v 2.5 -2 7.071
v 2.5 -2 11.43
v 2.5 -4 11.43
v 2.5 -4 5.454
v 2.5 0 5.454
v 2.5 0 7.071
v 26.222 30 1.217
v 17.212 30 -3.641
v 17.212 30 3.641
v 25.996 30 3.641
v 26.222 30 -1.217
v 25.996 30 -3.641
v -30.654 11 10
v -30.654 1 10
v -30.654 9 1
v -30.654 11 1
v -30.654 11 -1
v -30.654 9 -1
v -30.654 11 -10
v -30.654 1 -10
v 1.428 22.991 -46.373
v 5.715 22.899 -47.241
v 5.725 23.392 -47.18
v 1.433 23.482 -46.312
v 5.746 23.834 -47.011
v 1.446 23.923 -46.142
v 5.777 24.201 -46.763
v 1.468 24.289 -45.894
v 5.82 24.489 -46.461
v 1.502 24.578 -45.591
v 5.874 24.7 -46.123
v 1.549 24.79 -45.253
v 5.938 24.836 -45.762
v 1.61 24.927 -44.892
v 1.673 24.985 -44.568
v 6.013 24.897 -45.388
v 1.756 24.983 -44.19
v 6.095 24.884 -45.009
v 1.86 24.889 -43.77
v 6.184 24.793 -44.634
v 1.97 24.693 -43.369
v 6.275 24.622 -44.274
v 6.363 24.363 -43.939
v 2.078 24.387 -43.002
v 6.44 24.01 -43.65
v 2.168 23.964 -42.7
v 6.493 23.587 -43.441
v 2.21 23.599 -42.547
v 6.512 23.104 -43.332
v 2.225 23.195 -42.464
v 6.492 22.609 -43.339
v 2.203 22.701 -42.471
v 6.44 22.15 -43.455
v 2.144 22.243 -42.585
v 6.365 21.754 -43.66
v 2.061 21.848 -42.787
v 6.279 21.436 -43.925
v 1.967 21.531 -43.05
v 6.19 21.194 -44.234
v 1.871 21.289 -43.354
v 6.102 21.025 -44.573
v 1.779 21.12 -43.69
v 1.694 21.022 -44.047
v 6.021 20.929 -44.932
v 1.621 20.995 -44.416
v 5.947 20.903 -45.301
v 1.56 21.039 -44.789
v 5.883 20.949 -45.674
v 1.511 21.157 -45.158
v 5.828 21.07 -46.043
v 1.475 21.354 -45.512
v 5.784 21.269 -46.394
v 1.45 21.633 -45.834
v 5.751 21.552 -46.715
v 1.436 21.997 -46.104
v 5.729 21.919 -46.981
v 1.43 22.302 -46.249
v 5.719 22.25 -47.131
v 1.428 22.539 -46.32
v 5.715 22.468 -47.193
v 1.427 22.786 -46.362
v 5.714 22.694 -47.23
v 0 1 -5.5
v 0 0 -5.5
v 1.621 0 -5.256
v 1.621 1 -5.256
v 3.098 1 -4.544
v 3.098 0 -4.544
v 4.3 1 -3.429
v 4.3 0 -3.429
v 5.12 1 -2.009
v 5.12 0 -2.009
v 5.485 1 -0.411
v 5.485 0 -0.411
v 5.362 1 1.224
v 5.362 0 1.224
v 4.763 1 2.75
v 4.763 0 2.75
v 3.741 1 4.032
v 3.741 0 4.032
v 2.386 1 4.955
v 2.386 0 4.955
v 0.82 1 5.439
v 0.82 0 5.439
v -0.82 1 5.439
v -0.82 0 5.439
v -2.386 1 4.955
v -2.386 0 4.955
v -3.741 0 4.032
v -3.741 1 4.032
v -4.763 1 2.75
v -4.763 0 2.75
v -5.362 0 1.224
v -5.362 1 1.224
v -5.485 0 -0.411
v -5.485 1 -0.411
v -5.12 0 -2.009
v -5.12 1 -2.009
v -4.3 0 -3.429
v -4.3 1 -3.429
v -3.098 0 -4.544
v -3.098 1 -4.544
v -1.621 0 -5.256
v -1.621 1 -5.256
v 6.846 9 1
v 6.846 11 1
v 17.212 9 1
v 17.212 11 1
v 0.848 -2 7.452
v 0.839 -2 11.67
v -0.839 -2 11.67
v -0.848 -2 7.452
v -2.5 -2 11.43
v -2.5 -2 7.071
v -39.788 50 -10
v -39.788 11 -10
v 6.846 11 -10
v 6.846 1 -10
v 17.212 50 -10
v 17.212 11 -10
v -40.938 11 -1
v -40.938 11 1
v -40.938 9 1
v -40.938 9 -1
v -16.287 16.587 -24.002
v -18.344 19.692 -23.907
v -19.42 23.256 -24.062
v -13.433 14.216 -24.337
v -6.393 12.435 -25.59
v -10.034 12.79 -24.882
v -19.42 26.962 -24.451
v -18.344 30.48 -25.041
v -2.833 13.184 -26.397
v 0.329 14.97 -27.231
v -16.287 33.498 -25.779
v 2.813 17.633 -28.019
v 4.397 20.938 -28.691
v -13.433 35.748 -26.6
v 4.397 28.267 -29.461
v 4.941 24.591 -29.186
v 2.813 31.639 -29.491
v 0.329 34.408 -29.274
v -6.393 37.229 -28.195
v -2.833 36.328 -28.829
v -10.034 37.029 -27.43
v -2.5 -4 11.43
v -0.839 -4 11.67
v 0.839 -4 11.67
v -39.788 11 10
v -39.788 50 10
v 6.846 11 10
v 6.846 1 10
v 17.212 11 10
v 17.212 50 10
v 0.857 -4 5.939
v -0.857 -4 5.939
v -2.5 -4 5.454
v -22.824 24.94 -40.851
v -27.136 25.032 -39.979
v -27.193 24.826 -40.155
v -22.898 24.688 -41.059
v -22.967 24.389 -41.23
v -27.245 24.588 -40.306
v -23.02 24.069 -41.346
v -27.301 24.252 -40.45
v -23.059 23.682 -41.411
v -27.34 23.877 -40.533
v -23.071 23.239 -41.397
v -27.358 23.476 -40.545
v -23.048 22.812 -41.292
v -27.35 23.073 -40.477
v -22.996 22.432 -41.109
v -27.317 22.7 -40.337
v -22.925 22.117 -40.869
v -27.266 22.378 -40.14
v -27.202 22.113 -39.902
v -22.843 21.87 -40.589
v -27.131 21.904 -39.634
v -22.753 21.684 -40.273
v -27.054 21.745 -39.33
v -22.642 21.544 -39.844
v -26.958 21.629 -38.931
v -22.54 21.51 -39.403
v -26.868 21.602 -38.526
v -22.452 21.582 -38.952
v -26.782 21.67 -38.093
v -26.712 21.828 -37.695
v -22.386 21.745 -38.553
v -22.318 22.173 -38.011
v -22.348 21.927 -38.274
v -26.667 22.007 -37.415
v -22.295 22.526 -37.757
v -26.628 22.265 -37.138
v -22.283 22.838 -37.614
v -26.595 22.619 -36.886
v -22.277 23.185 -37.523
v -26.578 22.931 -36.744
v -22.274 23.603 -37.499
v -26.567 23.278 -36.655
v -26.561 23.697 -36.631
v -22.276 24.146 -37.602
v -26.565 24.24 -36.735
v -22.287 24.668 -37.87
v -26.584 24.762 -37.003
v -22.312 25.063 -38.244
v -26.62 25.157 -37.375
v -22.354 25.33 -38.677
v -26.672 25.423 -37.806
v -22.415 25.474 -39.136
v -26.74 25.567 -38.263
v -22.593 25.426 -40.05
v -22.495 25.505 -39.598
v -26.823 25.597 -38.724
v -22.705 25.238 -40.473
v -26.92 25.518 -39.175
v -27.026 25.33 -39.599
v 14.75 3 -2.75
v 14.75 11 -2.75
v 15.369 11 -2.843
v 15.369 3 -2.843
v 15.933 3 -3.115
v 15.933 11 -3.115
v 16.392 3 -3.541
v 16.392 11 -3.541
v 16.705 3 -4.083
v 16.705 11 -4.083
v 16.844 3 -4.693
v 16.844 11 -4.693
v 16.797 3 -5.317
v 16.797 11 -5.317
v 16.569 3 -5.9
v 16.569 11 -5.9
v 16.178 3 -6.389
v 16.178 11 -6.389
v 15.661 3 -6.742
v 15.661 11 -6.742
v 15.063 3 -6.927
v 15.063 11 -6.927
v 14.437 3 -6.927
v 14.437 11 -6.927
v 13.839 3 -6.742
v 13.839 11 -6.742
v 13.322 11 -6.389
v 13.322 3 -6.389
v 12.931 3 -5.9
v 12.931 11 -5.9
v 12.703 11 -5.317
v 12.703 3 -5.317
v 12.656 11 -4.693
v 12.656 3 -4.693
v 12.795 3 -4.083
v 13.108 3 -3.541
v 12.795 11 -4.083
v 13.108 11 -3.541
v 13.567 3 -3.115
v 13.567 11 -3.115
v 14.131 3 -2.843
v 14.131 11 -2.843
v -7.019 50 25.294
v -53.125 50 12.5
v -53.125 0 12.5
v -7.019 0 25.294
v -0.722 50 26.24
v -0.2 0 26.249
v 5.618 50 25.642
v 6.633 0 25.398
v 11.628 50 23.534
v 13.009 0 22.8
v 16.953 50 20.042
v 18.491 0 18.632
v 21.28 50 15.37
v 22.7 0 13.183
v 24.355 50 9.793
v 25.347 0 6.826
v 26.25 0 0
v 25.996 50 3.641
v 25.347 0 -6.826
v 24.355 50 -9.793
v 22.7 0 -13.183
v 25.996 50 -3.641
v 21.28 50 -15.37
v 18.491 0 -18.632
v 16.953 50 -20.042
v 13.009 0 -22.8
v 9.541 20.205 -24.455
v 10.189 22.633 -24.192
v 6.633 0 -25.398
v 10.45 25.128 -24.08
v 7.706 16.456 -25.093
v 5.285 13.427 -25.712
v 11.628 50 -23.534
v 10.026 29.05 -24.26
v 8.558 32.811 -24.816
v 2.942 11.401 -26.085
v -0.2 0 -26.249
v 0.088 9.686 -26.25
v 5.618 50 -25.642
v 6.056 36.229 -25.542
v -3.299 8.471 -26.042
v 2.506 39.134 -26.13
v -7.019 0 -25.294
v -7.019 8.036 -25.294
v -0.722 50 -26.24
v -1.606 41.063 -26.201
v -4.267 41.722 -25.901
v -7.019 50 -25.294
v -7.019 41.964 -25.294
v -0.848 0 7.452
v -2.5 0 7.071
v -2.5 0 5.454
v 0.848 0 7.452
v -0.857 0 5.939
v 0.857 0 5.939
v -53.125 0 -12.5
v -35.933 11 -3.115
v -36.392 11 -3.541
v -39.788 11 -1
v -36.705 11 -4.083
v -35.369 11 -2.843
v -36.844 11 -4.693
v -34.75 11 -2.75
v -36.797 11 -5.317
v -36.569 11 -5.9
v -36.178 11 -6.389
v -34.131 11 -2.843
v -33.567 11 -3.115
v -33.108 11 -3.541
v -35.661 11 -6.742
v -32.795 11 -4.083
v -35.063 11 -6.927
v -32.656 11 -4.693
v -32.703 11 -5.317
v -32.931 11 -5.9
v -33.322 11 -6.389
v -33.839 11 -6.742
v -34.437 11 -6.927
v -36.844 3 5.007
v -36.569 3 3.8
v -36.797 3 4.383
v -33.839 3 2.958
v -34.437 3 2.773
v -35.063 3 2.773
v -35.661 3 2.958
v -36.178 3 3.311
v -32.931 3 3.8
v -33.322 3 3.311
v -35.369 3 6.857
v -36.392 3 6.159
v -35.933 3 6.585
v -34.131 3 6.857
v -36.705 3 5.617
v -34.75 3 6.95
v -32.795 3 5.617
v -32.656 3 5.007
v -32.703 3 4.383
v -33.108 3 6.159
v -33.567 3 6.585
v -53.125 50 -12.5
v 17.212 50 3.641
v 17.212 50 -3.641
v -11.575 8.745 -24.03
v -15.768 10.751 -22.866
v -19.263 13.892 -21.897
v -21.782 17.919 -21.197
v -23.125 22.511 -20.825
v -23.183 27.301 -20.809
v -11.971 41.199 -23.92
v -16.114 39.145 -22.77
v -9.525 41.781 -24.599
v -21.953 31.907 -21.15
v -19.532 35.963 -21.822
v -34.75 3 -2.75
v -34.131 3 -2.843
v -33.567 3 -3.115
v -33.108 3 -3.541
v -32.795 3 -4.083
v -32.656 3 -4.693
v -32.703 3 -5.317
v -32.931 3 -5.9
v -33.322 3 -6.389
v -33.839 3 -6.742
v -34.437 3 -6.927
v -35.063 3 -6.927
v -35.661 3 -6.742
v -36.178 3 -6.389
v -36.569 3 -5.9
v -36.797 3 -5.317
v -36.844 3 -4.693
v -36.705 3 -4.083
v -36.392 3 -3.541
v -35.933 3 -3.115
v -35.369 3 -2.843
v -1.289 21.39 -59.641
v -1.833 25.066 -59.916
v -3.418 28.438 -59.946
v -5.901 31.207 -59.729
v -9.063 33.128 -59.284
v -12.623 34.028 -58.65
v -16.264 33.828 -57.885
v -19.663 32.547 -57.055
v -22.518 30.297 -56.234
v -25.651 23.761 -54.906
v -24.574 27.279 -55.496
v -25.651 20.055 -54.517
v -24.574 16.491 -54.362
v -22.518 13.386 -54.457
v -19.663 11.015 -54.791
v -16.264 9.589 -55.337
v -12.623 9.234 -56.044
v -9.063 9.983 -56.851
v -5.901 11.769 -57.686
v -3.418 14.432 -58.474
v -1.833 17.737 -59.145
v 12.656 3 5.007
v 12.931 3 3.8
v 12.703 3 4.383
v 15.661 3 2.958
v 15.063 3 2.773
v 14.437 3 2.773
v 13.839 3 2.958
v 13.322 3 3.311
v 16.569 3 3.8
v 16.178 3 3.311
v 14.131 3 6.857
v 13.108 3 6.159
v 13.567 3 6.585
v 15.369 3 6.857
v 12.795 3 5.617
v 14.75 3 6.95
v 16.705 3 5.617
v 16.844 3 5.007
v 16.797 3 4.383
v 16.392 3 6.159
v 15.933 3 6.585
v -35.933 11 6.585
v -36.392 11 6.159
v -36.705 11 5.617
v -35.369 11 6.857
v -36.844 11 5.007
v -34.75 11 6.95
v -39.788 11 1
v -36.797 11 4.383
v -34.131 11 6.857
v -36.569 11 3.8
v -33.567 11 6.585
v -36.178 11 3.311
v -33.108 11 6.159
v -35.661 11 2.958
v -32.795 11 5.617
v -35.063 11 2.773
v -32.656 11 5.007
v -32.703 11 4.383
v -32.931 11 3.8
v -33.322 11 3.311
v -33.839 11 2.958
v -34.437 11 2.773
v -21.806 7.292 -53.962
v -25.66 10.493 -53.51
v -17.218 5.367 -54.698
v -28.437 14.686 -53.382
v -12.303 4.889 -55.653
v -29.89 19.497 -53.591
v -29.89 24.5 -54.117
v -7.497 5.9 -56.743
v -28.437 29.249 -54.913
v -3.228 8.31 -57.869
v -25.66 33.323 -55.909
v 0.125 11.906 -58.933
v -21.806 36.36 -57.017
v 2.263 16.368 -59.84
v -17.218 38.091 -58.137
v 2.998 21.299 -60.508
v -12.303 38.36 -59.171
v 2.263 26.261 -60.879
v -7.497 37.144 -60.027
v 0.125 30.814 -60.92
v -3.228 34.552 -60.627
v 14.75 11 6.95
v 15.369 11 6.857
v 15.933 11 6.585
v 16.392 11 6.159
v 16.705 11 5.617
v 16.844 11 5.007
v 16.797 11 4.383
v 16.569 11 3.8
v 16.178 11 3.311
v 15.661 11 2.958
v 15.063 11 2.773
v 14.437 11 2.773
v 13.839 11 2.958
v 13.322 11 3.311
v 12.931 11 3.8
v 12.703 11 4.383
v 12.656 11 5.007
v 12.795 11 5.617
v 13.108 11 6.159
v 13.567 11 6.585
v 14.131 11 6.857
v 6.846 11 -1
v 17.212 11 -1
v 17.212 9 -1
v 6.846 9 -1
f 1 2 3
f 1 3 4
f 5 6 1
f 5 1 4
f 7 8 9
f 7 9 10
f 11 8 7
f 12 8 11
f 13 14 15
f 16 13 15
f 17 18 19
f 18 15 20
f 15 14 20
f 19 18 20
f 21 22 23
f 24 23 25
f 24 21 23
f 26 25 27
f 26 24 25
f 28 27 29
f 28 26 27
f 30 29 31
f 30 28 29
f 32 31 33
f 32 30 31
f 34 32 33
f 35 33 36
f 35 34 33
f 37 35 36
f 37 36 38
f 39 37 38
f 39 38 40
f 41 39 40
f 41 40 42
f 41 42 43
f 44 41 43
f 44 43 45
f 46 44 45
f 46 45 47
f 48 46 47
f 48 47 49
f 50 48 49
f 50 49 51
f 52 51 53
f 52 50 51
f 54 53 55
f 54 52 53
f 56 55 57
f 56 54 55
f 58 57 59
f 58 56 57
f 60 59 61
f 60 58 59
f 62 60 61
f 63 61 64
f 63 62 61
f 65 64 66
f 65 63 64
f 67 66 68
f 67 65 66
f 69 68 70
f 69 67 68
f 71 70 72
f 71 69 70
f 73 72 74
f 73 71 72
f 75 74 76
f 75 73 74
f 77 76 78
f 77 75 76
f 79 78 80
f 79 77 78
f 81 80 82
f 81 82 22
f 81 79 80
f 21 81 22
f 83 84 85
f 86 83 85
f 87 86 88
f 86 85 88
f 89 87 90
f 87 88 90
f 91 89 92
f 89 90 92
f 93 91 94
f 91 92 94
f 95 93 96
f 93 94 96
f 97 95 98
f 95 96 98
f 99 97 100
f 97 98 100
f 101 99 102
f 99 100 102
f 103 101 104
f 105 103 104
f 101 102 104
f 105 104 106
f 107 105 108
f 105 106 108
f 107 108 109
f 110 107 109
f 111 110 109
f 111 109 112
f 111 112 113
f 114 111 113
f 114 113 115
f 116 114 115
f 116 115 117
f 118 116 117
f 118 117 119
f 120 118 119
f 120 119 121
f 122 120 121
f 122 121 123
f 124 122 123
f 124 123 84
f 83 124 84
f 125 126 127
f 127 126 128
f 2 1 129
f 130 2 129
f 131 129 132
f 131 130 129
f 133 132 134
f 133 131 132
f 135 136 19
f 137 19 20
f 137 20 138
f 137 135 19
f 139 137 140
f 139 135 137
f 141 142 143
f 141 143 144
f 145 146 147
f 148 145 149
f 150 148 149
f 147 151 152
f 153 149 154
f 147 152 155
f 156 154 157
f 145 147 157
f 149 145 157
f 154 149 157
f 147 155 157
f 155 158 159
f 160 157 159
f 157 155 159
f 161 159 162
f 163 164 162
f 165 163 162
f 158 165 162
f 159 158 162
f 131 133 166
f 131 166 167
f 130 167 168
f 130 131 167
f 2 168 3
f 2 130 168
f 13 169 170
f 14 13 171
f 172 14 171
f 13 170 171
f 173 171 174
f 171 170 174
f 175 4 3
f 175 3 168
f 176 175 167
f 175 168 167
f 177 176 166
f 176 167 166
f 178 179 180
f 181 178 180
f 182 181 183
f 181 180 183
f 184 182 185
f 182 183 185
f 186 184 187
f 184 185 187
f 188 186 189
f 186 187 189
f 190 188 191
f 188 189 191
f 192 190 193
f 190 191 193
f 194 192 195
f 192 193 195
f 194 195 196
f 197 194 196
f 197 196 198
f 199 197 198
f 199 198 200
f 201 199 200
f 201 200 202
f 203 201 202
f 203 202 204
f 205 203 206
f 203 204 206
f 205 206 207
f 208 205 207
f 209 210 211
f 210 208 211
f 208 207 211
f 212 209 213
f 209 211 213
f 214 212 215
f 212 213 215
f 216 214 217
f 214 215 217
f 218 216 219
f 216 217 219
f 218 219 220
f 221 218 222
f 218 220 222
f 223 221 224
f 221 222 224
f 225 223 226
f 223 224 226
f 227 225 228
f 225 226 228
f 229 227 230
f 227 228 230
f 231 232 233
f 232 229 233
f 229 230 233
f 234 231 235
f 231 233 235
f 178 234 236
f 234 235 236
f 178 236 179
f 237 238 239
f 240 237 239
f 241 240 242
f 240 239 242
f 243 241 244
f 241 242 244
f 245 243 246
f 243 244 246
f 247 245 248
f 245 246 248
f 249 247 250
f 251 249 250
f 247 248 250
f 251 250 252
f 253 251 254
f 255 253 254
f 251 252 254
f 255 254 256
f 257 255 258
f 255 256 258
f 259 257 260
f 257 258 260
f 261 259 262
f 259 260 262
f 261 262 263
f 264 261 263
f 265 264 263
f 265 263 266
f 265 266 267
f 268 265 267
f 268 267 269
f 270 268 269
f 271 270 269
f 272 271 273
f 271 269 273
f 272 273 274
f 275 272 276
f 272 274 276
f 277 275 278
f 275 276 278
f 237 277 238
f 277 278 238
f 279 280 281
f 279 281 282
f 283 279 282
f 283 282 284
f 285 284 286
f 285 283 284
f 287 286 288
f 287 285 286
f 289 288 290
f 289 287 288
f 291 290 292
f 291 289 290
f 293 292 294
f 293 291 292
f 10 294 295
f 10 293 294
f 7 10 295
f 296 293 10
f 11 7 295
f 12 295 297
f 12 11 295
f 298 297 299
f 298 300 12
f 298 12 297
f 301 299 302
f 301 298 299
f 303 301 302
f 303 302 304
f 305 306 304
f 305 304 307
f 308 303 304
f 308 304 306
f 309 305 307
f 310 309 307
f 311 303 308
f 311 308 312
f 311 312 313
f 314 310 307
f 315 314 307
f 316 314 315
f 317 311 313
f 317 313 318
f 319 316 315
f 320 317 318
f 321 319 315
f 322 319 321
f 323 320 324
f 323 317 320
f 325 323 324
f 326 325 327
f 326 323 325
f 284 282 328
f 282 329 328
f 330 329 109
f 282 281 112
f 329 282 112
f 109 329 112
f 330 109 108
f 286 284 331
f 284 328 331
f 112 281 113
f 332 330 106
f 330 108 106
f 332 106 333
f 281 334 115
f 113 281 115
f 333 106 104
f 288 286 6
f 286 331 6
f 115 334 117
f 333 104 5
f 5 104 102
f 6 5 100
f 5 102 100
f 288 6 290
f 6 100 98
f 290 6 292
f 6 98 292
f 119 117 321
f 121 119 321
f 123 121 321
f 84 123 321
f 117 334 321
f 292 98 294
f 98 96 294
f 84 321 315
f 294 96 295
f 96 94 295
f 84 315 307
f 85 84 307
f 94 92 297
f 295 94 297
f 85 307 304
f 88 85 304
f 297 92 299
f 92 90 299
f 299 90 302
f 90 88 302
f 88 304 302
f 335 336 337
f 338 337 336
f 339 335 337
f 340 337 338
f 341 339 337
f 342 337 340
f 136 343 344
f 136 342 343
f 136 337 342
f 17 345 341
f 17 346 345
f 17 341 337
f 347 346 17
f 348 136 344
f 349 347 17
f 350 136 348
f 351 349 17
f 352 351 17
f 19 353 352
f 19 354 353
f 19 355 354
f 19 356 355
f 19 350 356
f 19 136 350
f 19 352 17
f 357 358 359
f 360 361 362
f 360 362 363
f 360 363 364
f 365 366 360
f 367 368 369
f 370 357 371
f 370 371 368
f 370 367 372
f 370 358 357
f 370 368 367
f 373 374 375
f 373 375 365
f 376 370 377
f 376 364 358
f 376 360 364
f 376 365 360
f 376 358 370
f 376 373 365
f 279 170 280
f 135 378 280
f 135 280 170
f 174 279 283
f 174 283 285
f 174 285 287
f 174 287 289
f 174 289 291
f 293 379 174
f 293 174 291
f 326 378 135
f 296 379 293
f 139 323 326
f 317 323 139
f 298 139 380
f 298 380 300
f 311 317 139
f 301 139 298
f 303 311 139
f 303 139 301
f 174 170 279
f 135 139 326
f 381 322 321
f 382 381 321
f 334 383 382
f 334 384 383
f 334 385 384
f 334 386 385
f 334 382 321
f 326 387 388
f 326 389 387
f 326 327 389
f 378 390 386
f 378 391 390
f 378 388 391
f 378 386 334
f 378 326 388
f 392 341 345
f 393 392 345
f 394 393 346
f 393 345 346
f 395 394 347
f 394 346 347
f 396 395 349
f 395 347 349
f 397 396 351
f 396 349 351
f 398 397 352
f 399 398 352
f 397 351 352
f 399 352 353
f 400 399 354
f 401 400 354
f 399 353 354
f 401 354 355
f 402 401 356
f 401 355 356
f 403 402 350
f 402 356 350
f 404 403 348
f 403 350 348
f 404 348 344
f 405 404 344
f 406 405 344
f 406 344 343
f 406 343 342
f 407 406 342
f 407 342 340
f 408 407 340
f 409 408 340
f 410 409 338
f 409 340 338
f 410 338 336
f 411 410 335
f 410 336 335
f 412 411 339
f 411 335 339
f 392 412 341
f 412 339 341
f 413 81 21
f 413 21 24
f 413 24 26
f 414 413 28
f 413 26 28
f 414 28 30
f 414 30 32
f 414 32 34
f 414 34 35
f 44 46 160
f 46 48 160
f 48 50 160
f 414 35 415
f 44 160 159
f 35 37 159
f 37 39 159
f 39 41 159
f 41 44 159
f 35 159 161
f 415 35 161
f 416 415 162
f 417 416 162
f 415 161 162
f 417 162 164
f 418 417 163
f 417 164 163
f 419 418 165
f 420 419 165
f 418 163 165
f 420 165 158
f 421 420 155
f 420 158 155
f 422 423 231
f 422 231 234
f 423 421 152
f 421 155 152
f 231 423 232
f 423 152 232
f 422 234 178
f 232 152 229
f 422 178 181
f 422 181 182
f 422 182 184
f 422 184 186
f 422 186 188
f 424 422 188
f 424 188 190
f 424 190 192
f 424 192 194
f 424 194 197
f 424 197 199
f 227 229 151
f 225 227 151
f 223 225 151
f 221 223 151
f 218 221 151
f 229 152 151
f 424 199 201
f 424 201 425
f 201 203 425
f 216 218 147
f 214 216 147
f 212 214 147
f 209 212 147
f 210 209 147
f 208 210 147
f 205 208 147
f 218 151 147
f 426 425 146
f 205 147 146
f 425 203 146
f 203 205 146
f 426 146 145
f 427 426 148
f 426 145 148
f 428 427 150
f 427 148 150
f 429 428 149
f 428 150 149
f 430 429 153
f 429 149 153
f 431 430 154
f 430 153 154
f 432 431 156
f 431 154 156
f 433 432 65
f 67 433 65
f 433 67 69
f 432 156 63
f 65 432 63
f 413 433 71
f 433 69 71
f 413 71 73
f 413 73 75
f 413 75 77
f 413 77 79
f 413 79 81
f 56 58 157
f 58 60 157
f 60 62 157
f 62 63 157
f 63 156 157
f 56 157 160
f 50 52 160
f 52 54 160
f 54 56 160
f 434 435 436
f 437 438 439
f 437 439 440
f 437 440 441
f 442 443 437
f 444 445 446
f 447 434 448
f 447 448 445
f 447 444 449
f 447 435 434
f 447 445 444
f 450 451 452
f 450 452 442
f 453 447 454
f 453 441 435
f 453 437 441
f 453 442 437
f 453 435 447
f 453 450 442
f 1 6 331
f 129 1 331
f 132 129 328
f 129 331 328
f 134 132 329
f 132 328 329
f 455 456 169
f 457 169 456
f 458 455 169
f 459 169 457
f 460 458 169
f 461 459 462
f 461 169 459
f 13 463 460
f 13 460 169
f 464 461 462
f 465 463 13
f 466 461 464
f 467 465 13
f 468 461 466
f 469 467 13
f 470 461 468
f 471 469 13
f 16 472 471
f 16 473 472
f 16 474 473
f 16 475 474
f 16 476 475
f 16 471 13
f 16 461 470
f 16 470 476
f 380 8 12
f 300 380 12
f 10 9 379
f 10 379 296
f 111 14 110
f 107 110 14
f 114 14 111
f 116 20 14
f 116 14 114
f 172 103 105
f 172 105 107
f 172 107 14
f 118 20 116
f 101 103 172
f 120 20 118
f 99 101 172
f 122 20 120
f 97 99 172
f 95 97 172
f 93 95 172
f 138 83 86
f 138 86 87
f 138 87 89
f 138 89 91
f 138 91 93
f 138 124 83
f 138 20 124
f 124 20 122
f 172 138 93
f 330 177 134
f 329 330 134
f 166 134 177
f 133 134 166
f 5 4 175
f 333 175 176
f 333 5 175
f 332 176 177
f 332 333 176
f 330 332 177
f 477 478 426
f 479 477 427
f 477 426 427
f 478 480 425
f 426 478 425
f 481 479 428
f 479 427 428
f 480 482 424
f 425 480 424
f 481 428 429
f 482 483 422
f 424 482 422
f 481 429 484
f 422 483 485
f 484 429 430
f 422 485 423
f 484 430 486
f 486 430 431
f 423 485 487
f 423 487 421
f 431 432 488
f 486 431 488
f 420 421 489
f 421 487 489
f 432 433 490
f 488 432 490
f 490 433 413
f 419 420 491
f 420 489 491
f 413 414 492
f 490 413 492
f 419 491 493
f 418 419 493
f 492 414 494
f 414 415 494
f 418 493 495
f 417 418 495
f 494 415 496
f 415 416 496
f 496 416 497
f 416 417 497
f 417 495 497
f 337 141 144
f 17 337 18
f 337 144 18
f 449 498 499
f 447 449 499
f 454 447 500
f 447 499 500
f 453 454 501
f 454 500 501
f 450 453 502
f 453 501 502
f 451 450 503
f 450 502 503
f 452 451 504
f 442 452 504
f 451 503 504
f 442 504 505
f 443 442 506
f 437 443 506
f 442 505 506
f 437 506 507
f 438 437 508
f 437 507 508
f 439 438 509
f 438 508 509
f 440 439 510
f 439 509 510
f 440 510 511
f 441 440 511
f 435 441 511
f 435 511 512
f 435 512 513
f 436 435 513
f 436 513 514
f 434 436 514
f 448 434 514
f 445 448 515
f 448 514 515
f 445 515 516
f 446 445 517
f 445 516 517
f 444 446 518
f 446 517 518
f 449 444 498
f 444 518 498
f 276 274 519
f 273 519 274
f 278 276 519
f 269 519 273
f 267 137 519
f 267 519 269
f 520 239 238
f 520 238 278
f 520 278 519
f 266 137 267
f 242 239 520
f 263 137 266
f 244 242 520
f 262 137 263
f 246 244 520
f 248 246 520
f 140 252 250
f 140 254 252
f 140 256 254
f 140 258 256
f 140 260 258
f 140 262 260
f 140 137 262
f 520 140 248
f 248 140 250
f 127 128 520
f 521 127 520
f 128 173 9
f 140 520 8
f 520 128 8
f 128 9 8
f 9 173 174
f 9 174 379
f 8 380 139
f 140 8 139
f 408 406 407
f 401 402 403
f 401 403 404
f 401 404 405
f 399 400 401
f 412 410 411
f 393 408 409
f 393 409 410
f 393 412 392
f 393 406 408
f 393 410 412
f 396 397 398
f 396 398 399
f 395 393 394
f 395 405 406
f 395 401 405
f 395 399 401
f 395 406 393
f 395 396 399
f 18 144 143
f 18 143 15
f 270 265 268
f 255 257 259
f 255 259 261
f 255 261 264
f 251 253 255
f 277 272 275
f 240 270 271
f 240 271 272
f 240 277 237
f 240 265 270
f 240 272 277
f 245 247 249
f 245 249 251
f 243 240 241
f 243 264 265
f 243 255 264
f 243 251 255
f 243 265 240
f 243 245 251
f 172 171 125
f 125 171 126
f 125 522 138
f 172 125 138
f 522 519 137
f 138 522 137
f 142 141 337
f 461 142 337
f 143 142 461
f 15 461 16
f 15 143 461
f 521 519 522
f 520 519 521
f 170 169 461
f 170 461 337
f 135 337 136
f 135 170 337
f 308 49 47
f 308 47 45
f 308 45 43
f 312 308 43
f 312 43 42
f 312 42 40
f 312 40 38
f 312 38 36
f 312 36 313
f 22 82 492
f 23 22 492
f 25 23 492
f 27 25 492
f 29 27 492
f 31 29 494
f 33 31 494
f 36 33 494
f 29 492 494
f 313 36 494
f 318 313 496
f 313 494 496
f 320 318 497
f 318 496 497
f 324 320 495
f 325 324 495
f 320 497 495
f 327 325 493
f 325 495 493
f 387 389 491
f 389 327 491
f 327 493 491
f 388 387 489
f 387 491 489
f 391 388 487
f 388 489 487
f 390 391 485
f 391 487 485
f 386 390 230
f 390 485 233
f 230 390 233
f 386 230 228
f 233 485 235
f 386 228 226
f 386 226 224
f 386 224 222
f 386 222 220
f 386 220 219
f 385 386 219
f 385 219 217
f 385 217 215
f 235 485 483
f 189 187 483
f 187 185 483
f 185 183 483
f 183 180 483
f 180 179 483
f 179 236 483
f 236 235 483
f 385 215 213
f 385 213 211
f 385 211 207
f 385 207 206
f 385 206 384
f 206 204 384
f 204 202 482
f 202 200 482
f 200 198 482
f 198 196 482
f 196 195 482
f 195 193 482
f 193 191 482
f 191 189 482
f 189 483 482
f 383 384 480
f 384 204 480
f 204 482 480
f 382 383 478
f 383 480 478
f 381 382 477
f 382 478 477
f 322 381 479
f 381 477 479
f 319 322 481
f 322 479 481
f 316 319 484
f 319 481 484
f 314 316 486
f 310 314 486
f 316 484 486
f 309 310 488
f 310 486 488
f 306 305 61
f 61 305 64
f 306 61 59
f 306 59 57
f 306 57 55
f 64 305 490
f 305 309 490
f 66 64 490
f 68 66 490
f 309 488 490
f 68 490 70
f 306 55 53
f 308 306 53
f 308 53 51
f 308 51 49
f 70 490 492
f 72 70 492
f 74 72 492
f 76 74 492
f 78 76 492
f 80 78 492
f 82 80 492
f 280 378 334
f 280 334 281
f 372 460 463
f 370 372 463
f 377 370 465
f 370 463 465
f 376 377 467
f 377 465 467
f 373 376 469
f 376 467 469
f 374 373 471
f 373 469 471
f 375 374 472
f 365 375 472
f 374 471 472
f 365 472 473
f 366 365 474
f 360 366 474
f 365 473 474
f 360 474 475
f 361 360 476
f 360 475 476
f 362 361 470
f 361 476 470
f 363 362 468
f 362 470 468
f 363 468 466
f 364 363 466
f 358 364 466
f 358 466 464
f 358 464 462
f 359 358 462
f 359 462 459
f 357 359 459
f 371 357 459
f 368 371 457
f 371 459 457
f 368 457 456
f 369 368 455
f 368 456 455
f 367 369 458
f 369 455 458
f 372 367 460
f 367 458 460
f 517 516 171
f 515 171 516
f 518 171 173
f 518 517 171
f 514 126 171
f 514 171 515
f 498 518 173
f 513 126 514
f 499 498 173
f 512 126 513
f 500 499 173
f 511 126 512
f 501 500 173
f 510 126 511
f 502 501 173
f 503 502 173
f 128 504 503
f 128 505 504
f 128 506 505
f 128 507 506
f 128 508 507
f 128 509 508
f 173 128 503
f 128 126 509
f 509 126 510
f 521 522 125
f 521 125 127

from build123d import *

# Parameters (mm, degrees)
BOSS_EXTRUDE1_DEPTH       = 40
REVOLVE1_START            = -44.95139953
REVOLVE1_OUTLINE_R        = 13.5
REVOLVE1_DEPTH            = 30.829897511
M18_CLEARANCE_HOLE1_D     = 20
M18_CLEARANCE_HOLE1_DEPTH = 25
SKETCH9_W                 = 1.6
SKETCH9_H                 = 27
CUT_EXTRUDE4_DEPTH        = 76.299241718
CUT_EXTRUDE4_DEPTH_BACK   = 76.299241718
SKETCH18_R                = 1.6
SCALE2_SCALE              = 1.25
SKETCH19_W                = 57
SKETCH19_H                = 20
CUT_EXTRUDE5_DEPTH        = 39
SKETCH20_W                = 40
SKETCH20_H                = 20
CUT_EXTRUDE6_DEPTH        = 10
SKETCH21_R                = 5.5
CUT_EXTRUDE7_DEPTH        = 96.0605556
SKETCH22_W                = 7.783449774
SKETCH22_H                = 2
SKETCH22_W_2              = 10.366550226
CUT_EXTRUDE8_DEPTH        = 2
SKETCH23_W                = 9.71853625
SKETCH23_H                = 7.281011564
CUT_EXTRUDE9_DEPTH        = 20
SKETCH25_W                = 2.5
SKETCH25_H                = 9
BOSS_EXTRUDE3_DEPTH       = 10
SKETCH26_W                = 2.5
SKETCH26_H                = 2
BOSS_EXTRUDE4_DEPTH       = 8
SKETCH27_R                = 2.1
CUT_EXTRUDE10_DEPTH       = 8
BOSS_EXTRUDE5_DEPTH       = 2
BOSS_EXTRUDE6_DEPTH       = 2


with BuildPart() as part:
    # Sketch1 → Boss-Extrude1 (new body)
    with BuildSketch(Plane(origin=(0, 40, 0), x_dir=(1, 0, 0), z_dir=(0, 1, 0))):
        with BuildLine():
            Line((-5.61521172, 20.235350191), (-42.5, 10))
            Line((-42.5, 10), (-42.5, -10))
            Line((-42.5, -10), (-5.61521172, -20.235350191))
            ThreePointArc((-5.61521172, -20.235350191), (21, 0), (-5.61521172, 20.235350191))
        make_face()
    extrude(amount=-BOSS_EXTRUDE1_DEPTH)

    # Revolve1: read off the stored shape, not the designer's step
    # Revolve1 outline → Revolve1 (add)
    with BuildSketch(Plane(origin=(0, 0, 0), x_dir=(0.9799247046208294, -0.02083962380947531, -0.19827577601224947), z_dir=(0.19936793441719802, 0.10243002349202102, 0.9745565745577031)).offset(REVOLVE1_START)):
        with Locations((-1.9070974, 22.005607966)):
            Circle(REVOLVE1_OUTLINE_R)
    extrude(amount=REVOLVE1_DEPTH)

    # M18 Clearance Hole1
    with Locations(Plane(origin=(-8.961867673, -4.60437291, -43.807681948), x_dir=(-0.9799247046208296, 0.02083962380947534, 0.19827577601224922), z_dir=(-0.19936793441719777, -0.10243002349202121, -0.9745565745577032))):
        with Locations((1.9070974, 22.005607966)):
            Hole(M18_CLEARANCE_HOLE1_D / 2, depth=M18_CLEARANCE_HOLE1_DEPTH)

    # Sketch9 → M3.5 Clearance Hole1 (revolve, cut)
    with BuildSketch(Plane(origin=(-18.009225855, 18.806465846, -31.591069121), x_dir=(-0.12392681772022805, 0.7153744254872676, -0.6876638533531477), z_dir=(0.1561720753640579, 0.6984304843277114, 0.6984304843277114))):
        with Locations((0.8, 13.5)):
            Rectangle(SKETCH9_W, SKETCH9_H)
    revolve(axis=Axis((-11.78670398, 18.674134235, -32.850120299), (-0.9799247046208297, 0.020839623809475325, 0.19827577601224802)), mode=Mode.SUBTRACT)

    # Sketch18 → Cut-Extrude4 (cut, two sides: drawn at the far end of the back side and taken through both)
    with BuildSketch(Plane(origin=(-1.740210315, 0.03700828, 0.352110268), x_dir=(-0.19823095447813932, 0.004215689735382395, -0.9801462730872066), z_dir=(0.9799247046208297, -0.020839623809475356, -0.19827577601224802)).offset(-CUT_EXTRUDE4_DEPTH_BACK)):
        with Locations(Location((34.613136918, 18.419306886, 0), (0, 0, 359.758405588))):
            Circle(SKETCH18_R)
    extrude(amount=CUT_EXTRUDE4_DEPTH + CUT_EXTRUDE4_DEPTH_BACK, mode=Mode.SUBTRACT)


with BuildPart() as part_1:
    # Scale2: scaled about (0, 0, 0)
    add(part.part.scale(SCALE2_SCALE))

    # Sketch19 → Cut-Extrude5 (cut)
    with BuildSketch(Plane(origin=(0, 50, 0), x_dir=(1, 0, 0), z_dir=(0, 1, 0))):
        with Locations((-11.2875, 0)):
            Rectangle(SKETCH19_W, SKETCH19_H)
    extrude(amount=-CUT_EXTRUDE5_DEPTH, mode=Mode.SUBTRACT)

    # Sketch20 → Cut-Extrude6 (cut)
    with BuildSketch(Plane(origin=(0, 11, 0), x_dir=(1, 0, 0), z_dir=(0, 1, 0))):
        with Locations((-13.154050226, 0)):
            Rectangle(SKETCH20_W, SKETCH20_H)
    extrude(amount=-CUT_EXTRUDE6_DEPTH, mode=Mode.SUBTRACT)

    # Sketch21 → Cut-Extrude7 (cut, through all)
    with BuildSketch(Plane.XZ):
        with Locations(Location((0, 0, 0), (0, 0, 270))):
            Circle(SKETCH21_R)
    extrude(amount=-CUT_EXTRUDE7_DEPTH, mode=Mode.SUBTRACT)

    # Sketch22 → Cut-Extrude8 (cut)
    with BuildSketch(Plane(origin=(0, 11, 0), x_dir=(1, 0, 0), z_dir=(0, 1, 0))):
        with Locations((-37.045775113, 0)):
            Rectangle(SKETCH22_W, SKETCH22_H)
        with Locations((12.029224887, 0)):
            Rectangle(SKETCH22_W_2, SKETCH22_H)
    extrude(amount=-CUT_EXTRUDE8_DEPTH, mode=Mode.SUBTRACT)

    # Sketch23 → Cut-Extrude9 (cut)
    with BuildSketch(Plane(origin=(0, 50, 0), x_dir=(1, 0, 0), z_dir=(0, 1, 0))):
        with Locations((22.071768125, 0)):
            Rectangle(SKETCH23_W, SKETCH23_H)
    extrude(amount=-CUT_EXTRUDE9_DEPTH, mode=Mode.SUBTRACT)

    # Sketch25 → Boss-Extrude3 (add)
    with BuildSketch(Plane(origin=(0, 1, 0), x_dir=(1, 0, 0), z_dir=(0, 1, 0))):
        with Locations((-31.904050226, 5.5)):
            Rectangle(SKETCH25_W, SKETCH25_H)
        with Locations((-31.904050226, -5.5)):
            Rectangle(SKETCH25_W, SKETCH25_H)
    extrude(amount=BOSS_EXTRUDE3_DEPTH)

    # Sketch26 → Boss-Extrude4 (add)
    with BuildSketch(Plane(origin=(0, 1, 0), x_dir=(1, 0, 0), z_dir=(0, 1, 0))):
        with Locations((-31.904050226, 0)):
            Rectangle(SKETCH26_W, SKETCH26_H)
    extrude(amount=BOSS_EXTRUDE4_DEPTH)

    # Sketch27 → Cut-Extrude10 (cut)
    with BuildSketch(Plane(origin=(0, 11, 0), x_dir=(1, 0, 0), z_dir=(0, 1, 0))):
        with Locations(Location((14.75, 4.85, 0), (0, 0, 270))):
            Circle(SKETCH27_R)
        with Locations(Location((14.75, -4.85, 0), (0, 0, 270))):
            Circle(SKETCH27_R)
        with Locations(Location((-34.75, 4.85, 0), (0, 0, 270))):
            Circle(SKETCH27_R)
        with Locations(Location((-34.75, -4.85, 0), (0, 0, 270))):
            Circle(SKETCH27_R)
    extrude(amount=-CUT_EXTRUDE10_DEPTH, mode=Mode.SUBTRACT)

    # Sketch35 → Boss-Extrude5 (add)
    with BuildSketch(Plane.XZ):
        with BuildLine():
            Line((-2.5, 7.071067812), (-2.5, 5.454356057))
            ThreePointArc((-2.5, 5.454356057), (0, 6), (2.5, 5.454356057))
            Line((2.5, 5.454356057), (2.5, 7.071067812))
            ThreePointArc((2.5, 7.071067812), (0, 7.5), (-2.5, 7.071067812))
        make_face()
    extrude(amount=BOSS_EXTRUDE5_DEPTH)

    # Sketch36 → Boss-Extrude6 (add)
    with BuildSketch(Plane.XZ.offset(2)):
        with BuildLine():
            Line((-2.5, 5.454356057), (-2.5, 11.42978565))
            ThreePointArc((-2.5, 11.42978565), (0, 11.7), (2.5, 11.42978565))
            Line((2.5, 11.42978565), (2.5, 5.454356057))
            ThreePointArc((2.5, 5.454356057), (0, 6), (-2.5, 5.454356057))
        make_face()
    extrude(amount=BOSS_EXTRUDE6_DEPTH)


solid = part_1.part
